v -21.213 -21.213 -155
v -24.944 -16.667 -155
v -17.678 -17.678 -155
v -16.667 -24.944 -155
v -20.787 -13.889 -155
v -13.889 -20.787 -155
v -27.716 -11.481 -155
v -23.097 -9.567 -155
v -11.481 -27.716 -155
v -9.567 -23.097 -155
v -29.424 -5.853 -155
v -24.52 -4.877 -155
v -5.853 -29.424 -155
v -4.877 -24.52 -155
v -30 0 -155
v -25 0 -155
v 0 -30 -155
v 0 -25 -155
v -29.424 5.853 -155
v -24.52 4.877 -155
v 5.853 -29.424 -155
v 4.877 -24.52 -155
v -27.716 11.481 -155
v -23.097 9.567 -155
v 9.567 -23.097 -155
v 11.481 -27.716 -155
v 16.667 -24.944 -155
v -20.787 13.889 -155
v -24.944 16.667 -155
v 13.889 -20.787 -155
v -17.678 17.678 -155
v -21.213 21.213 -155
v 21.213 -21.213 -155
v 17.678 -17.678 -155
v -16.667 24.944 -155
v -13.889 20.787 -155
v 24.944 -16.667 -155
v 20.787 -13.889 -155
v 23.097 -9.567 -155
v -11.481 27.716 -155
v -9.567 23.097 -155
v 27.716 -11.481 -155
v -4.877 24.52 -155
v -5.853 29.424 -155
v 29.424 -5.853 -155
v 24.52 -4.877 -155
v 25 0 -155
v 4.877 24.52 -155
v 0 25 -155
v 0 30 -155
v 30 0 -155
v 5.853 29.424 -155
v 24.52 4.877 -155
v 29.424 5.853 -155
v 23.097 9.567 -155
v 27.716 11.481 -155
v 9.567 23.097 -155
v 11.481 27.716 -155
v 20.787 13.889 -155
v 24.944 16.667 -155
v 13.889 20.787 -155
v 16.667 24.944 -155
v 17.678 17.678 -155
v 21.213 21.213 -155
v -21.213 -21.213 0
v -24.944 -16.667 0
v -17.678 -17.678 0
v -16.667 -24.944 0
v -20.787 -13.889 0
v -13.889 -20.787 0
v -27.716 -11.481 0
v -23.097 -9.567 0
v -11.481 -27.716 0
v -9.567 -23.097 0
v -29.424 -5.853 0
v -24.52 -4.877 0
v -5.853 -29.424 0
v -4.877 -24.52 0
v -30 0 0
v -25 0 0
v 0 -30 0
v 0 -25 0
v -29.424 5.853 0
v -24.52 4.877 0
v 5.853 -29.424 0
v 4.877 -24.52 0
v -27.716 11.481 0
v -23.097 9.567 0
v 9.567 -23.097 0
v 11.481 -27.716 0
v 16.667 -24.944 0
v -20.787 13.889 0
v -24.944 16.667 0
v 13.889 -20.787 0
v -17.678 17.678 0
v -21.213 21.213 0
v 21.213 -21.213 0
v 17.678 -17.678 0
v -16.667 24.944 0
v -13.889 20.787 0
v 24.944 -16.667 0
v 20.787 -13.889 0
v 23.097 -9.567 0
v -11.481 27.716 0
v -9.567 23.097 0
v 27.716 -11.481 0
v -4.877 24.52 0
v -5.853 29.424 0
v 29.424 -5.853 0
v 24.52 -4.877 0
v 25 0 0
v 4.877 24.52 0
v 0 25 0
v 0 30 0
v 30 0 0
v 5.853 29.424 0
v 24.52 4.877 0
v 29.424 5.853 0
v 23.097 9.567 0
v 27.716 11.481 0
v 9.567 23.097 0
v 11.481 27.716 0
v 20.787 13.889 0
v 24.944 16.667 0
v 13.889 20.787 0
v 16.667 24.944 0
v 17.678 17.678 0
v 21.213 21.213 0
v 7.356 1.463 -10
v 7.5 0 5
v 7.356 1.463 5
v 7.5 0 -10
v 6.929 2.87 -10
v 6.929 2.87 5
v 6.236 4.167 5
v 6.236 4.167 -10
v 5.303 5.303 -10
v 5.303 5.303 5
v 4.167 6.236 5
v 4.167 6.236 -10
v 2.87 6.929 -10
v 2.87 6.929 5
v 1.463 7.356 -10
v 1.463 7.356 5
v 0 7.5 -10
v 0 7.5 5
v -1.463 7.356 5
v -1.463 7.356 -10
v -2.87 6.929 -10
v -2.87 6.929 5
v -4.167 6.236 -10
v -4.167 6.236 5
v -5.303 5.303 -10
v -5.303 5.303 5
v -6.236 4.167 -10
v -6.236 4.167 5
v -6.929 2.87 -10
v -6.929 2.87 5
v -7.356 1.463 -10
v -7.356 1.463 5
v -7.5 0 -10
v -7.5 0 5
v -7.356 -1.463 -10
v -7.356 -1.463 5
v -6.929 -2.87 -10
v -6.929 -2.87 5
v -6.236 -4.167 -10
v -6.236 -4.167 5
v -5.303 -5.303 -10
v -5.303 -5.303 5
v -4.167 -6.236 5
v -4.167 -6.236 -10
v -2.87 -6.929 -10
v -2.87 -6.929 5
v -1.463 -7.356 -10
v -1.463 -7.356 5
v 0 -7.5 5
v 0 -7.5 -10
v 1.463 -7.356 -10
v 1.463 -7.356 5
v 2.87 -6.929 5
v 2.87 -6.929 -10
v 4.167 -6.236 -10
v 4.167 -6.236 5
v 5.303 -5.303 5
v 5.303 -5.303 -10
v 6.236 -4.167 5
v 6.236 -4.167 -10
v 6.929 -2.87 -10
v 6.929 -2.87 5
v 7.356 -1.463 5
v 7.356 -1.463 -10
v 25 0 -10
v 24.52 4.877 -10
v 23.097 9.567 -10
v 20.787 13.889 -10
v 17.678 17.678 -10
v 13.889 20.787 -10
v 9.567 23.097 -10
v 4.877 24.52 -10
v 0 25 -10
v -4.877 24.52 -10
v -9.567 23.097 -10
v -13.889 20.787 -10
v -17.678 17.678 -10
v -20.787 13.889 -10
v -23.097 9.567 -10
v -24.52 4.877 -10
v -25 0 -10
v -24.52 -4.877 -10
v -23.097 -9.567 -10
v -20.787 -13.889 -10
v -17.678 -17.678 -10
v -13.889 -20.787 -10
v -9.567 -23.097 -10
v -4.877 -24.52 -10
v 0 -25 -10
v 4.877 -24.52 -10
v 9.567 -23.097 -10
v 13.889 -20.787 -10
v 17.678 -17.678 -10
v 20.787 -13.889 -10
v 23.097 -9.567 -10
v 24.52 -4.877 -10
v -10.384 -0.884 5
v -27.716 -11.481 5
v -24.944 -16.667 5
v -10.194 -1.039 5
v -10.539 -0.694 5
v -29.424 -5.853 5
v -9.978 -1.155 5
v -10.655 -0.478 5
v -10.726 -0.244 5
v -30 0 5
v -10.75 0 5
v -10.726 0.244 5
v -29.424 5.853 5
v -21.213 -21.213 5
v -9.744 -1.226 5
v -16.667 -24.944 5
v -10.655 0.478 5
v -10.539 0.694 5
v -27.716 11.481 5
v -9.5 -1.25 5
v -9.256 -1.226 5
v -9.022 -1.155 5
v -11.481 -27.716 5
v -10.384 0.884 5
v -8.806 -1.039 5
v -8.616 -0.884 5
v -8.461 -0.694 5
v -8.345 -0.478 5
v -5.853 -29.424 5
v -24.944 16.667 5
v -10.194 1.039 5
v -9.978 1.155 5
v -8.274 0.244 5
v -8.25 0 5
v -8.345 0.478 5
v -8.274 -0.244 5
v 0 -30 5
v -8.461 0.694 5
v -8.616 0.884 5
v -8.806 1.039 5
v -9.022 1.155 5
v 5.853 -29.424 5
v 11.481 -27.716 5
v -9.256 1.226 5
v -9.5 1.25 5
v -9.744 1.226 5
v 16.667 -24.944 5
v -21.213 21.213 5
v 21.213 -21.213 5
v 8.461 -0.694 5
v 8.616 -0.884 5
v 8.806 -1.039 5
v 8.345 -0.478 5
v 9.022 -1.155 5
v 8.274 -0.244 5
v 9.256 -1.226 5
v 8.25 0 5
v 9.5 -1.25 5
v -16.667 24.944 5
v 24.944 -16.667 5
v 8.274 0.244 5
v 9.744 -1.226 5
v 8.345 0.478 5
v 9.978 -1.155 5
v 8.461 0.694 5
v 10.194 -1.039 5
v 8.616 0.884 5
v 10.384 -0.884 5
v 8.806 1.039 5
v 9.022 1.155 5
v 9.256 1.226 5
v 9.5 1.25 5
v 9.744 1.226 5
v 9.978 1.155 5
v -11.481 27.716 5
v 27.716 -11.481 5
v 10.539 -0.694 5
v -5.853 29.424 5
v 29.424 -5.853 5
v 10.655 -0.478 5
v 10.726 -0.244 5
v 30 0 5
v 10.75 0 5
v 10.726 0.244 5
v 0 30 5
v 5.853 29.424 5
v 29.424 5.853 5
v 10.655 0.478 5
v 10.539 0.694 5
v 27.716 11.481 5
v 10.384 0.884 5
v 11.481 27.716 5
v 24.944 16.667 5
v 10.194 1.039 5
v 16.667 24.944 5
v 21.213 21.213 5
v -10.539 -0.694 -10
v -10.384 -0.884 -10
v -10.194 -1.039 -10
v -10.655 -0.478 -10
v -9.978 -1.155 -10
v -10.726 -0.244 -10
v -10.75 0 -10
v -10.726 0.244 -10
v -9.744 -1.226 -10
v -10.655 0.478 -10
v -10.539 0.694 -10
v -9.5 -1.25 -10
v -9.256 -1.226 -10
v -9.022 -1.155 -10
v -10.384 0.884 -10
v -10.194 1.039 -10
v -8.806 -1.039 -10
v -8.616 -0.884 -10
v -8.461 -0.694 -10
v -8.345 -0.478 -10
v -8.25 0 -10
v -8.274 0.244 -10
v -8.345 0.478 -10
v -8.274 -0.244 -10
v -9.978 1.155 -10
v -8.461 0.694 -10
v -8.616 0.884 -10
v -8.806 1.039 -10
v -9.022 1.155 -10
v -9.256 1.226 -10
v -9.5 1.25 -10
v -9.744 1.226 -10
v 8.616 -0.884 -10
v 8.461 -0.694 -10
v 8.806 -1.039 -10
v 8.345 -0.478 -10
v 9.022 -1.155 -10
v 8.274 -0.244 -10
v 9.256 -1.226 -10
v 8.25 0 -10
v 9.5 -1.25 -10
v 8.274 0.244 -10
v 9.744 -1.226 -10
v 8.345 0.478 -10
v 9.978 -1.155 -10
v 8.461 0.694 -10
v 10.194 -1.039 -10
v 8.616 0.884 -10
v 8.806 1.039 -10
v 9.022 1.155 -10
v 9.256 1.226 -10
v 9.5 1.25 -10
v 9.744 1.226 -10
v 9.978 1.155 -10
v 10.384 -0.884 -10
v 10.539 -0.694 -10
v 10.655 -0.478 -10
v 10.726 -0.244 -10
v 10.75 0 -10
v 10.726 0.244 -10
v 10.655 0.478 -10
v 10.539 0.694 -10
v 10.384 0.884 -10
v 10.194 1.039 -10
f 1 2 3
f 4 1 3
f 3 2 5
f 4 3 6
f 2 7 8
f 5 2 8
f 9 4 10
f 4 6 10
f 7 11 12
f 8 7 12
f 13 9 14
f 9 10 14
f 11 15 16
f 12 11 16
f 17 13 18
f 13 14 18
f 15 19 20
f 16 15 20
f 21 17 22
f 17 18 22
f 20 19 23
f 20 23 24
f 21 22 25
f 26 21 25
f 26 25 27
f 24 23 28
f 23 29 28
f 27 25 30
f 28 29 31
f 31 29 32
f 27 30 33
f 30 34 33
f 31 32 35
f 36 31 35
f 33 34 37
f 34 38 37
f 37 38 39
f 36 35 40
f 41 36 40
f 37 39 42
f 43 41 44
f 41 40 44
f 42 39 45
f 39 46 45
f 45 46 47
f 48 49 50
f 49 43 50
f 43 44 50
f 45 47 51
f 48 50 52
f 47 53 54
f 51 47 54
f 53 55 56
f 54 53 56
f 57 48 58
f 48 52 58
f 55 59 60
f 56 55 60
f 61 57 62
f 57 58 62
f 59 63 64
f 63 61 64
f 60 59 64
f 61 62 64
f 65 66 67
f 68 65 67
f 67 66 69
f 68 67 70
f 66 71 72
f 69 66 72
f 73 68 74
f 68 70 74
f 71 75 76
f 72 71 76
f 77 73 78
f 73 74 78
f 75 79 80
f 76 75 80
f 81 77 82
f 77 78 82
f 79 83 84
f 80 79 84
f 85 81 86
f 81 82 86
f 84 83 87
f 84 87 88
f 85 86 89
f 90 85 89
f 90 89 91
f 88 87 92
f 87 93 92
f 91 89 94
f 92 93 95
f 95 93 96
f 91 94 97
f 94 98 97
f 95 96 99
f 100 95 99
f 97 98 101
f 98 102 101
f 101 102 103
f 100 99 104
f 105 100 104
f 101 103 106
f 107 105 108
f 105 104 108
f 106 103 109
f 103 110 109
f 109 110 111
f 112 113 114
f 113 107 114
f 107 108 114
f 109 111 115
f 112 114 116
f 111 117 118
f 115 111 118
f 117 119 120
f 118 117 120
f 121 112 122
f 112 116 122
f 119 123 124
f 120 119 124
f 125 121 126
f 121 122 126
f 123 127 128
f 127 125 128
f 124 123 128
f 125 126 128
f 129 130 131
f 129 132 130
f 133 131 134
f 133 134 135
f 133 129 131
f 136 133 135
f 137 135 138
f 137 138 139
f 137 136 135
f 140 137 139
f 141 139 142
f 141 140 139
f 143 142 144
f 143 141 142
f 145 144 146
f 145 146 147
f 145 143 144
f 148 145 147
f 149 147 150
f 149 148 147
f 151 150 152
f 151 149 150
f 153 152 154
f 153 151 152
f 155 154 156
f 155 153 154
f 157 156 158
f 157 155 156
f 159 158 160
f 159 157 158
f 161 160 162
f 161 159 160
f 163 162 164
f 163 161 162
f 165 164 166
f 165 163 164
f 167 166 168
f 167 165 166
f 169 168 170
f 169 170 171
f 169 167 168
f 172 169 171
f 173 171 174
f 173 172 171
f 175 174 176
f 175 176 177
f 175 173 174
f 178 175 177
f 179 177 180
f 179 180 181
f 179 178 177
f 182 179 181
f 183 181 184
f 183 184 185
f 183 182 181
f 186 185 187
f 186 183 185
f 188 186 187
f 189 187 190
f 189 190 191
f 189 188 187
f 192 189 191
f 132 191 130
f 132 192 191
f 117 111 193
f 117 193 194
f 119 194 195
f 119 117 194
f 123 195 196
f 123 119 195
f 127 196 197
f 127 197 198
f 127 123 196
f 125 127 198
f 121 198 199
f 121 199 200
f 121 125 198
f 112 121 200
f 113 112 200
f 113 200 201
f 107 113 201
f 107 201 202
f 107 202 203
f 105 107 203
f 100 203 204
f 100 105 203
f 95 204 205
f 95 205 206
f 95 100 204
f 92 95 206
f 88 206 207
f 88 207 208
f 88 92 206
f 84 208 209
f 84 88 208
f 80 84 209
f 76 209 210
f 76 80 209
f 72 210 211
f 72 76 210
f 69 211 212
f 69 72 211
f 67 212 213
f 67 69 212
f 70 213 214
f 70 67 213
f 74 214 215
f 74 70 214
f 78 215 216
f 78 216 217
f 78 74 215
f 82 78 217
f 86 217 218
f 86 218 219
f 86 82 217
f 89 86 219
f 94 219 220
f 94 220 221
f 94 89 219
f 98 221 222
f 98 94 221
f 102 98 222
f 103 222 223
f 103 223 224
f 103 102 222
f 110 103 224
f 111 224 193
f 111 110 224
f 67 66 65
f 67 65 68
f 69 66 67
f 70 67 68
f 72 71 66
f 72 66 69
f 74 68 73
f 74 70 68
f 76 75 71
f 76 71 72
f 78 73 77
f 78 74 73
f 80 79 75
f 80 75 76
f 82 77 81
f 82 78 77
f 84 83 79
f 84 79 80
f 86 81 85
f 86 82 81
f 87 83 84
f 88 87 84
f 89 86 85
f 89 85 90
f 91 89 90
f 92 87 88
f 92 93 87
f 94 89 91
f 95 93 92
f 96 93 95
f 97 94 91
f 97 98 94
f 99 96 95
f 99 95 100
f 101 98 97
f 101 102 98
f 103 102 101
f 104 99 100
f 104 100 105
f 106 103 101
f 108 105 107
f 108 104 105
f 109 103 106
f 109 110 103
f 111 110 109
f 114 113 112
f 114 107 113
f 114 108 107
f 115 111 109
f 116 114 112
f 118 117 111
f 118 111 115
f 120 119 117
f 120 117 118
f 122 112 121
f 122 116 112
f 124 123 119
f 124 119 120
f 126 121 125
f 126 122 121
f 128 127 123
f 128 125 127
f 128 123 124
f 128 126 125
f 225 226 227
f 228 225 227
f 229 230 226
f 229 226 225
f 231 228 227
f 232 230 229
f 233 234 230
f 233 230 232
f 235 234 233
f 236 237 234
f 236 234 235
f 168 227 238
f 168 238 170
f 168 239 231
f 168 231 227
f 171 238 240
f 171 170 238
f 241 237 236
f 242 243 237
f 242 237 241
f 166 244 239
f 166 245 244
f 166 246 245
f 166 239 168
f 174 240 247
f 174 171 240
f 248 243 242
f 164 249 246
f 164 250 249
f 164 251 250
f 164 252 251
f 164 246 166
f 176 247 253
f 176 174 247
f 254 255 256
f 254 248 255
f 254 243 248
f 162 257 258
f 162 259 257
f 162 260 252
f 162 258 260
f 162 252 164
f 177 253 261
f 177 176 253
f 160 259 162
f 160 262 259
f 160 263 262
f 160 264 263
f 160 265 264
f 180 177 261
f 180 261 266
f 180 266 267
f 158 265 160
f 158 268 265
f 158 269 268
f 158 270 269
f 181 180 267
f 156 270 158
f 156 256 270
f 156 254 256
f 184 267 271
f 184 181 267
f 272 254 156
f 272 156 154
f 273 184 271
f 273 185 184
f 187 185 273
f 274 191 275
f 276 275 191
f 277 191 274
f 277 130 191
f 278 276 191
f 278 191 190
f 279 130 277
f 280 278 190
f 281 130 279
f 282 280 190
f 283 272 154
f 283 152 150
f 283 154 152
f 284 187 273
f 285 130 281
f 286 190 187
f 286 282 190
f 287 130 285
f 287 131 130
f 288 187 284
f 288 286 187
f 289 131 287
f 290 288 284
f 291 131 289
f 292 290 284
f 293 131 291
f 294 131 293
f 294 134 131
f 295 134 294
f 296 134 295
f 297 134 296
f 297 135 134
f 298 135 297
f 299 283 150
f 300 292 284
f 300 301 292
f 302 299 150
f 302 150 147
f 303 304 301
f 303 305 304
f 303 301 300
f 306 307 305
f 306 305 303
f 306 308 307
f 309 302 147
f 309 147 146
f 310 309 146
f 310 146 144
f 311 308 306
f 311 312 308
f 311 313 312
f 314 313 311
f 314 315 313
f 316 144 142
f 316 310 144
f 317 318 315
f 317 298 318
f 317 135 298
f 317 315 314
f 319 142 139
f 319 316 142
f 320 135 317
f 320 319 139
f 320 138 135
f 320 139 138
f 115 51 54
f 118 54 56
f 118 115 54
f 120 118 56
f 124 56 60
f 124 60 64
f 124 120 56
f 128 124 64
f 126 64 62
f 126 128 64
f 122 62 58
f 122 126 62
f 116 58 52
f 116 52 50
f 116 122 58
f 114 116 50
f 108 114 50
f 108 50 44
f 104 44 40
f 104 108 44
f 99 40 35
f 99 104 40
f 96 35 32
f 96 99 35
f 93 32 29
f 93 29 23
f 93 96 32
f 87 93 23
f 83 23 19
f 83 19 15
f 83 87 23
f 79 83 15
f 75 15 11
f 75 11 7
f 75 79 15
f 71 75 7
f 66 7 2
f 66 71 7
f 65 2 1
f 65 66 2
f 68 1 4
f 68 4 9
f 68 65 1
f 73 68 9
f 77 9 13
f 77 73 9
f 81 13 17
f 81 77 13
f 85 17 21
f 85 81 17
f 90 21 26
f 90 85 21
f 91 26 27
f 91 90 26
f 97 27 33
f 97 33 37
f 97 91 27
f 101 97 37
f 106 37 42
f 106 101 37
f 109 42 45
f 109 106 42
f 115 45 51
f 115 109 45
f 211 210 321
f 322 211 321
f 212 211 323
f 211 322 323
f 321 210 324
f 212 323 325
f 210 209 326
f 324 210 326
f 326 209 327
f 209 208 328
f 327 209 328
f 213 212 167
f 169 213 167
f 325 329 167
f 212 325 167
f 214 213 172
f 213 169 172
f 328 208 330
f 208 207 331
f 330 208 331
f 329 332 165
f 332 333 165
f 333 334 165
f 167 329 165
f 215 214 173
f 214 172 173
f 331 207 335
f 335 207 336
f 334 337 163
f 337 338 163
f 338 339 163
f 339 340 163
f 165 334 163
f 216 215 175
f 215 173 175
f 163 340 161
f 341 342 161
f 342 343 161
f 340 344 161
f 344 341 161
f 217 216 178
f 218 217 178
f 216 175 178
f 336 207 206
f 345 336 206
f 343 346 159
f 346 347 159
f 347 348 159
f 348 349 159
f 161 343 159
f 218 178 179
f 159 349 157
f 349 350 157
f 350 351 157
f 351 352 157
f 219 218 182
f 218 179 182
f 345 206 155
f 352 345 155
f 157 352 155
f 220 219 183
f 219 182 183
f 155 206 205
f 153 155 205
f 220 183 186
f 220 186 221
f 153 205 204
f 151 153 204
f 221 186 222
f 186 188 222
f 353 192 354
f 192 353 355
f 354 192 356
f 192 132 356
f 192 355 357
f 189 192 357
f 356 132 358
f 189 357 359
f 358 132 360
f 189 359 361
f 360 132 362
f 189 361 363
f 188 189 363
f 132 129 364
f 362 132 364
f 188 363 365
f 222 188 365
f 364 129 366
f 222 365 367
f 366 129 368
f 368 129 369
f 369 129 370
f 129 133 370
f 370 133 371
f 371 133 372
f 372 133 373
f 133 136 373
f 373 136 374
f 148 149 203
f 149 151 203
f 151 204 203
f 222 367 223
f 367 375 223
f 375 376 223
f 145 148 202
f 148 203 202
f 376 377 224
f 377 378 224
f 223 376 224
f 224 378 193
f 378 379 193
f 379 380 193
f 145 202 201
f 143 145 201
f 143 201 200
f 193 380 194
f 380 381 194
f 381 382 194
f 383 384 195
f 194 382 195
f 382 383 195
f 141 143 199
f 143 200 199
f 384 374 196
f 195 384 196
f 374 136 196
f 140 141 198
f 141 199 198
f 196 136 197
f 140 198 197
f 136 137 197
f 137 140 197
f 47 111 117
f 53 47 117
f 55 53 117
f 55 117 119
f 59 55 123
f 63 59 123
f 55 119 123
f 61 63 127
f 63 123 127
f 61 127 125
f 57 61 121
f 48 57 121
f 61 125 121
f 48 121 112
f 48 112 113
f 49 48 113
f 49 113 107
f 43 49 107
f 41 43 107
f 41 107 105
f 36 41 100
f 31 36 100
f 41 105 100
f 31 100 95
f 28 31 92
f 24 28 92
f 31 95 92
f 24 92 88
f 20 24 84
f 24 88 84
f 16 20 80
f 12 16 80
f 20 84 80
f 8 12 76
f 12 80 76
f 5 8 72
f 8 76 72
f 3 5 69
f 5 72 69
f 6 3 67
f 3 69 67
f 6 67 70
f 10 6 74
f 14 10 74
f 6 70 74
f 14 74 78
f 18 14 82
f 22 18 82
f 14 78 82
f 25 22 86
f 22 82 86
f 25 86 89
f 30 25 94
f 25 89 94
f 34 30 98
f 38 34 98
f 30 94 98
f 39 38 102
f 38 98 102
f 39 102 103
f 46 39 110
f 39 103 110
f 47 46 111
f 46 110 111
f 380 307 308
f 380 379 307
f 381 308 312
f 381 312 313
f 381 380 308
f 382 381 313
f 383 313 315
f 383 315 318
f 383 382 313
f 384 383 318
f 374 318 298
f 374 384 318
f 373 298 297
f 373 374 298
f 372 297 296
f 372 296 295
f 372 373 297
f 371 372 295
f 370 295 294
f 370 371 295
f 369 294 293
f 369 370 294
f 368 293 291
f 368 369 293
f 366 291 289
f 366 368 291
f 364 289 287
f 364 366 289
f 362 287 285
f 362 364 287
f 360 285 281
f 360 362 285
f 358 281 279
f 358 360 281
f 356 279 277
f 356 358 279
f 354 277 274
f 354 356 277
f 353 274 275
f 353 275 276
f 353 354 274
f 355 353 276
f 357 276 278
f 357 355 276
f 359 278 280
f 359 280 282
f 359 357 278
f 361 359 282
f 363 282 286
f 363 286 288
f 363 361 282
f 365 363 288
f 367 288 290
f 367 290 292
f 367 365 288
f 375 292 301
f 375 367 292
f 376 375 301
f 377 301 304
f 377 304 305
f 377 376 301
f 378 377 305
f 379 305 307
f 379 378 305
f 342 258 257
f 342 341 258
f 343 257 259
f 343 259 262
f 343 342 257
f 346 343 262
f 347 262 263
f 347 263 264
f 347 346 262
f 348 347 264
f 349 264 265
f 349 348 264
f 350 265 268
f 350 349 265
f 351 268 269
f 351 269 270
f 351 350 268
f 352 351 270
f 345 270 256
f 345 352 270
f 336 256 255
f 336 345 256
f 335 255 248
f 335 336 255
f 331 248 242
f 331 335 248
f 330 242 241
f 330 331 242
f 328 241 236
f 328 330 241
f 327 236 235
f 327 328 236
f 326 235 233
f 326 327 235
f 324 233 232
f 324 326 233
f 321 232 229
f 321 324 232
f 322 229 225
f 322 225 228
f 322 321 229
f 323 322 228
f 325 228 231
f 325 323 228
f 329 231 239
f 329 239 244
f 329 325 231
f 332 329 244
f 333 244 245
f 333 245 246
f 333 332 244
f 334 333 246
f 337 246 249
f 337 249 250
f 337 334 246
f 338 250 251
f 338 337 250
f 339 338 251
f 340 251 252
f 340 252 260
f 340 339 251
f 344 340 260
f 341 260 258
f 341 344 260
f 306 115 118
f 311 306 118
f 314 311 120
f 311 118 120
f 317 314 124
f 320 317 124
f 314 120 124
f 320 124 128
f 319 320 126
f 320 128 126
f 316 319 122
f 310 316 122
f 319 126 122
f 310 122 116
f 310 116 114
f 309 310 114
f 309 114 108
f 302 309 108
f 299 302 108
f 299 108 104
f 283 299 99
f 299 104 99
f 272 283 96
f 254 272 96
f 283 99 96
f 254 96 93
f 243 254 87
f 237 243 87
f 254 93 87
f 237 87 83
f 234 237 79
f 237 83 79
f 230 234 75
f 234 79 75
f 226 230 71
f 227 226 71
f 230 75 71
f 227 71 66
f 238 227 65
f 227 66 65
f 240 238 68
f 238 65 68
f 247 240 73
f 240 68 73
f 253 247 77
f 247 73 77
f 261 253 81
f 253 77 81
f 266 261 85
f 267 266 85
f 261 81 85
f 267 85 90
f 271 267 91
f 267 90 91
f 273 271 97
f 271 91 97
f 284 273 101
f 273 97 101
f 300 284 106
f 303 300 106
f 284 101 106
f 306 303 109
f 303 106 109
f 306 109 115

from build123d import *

# Parameters (mm, degrees)
F0_R     = 30
F0_R_2   = 25
F1_DEPTH = 155
F0_R_3   = 1.25
F0_R_4   = 7.5
F2_DEPTH = 10
F3_DEPTH = 5


with BuildPart() as f1:
    # F0 (on Top) → F1 (new body)
    with BuildSketch(Plane.XY):
        Circle(F0_R)
        Circle(F0_R_2, mode=Mode.SUBTRACT)
    extrude(amount=-F1_DEPTH)


with BuildPart() as f2:
    # F0 (on Top) → F2 (new body)
    with BuildSketch(Plane.XY):
        Circle(F0_R_2)
        with Locations((-9.5, 0)):
            Circle(F0_R_3, mode=Mode.SUBTRACT)
        Circle(F0_R_4, mode=Mode.SUBTRACT)
        with Locations((9.5, 0)):
            Circle(F0_R_3, mode=Mode.SUBTRACT)
    extrude(amount=-F2_DEPTH)

    # F0 (on Top) → F3 (join)
    with BuildSketch(Plane.XY):
        Circle(F0_R)
        Circle(F0_R_2, mode=Mode.SUBTRACT)
        Circle(F0_R_2)
        with Locations((-9.5, 0)):
            Circle(F0_R_3, mode=Mode.SUBTRACT)
        Circle(F0_R_4, mode=Mode.SUBTRACT)
        with Locations((9.5, 0)):
            Circle(F0_R_3, mode=Mode.SUBTRACT)
    extrude(amount=F3_DEPTH)


solid = Compound([f1.part, f2.part])
